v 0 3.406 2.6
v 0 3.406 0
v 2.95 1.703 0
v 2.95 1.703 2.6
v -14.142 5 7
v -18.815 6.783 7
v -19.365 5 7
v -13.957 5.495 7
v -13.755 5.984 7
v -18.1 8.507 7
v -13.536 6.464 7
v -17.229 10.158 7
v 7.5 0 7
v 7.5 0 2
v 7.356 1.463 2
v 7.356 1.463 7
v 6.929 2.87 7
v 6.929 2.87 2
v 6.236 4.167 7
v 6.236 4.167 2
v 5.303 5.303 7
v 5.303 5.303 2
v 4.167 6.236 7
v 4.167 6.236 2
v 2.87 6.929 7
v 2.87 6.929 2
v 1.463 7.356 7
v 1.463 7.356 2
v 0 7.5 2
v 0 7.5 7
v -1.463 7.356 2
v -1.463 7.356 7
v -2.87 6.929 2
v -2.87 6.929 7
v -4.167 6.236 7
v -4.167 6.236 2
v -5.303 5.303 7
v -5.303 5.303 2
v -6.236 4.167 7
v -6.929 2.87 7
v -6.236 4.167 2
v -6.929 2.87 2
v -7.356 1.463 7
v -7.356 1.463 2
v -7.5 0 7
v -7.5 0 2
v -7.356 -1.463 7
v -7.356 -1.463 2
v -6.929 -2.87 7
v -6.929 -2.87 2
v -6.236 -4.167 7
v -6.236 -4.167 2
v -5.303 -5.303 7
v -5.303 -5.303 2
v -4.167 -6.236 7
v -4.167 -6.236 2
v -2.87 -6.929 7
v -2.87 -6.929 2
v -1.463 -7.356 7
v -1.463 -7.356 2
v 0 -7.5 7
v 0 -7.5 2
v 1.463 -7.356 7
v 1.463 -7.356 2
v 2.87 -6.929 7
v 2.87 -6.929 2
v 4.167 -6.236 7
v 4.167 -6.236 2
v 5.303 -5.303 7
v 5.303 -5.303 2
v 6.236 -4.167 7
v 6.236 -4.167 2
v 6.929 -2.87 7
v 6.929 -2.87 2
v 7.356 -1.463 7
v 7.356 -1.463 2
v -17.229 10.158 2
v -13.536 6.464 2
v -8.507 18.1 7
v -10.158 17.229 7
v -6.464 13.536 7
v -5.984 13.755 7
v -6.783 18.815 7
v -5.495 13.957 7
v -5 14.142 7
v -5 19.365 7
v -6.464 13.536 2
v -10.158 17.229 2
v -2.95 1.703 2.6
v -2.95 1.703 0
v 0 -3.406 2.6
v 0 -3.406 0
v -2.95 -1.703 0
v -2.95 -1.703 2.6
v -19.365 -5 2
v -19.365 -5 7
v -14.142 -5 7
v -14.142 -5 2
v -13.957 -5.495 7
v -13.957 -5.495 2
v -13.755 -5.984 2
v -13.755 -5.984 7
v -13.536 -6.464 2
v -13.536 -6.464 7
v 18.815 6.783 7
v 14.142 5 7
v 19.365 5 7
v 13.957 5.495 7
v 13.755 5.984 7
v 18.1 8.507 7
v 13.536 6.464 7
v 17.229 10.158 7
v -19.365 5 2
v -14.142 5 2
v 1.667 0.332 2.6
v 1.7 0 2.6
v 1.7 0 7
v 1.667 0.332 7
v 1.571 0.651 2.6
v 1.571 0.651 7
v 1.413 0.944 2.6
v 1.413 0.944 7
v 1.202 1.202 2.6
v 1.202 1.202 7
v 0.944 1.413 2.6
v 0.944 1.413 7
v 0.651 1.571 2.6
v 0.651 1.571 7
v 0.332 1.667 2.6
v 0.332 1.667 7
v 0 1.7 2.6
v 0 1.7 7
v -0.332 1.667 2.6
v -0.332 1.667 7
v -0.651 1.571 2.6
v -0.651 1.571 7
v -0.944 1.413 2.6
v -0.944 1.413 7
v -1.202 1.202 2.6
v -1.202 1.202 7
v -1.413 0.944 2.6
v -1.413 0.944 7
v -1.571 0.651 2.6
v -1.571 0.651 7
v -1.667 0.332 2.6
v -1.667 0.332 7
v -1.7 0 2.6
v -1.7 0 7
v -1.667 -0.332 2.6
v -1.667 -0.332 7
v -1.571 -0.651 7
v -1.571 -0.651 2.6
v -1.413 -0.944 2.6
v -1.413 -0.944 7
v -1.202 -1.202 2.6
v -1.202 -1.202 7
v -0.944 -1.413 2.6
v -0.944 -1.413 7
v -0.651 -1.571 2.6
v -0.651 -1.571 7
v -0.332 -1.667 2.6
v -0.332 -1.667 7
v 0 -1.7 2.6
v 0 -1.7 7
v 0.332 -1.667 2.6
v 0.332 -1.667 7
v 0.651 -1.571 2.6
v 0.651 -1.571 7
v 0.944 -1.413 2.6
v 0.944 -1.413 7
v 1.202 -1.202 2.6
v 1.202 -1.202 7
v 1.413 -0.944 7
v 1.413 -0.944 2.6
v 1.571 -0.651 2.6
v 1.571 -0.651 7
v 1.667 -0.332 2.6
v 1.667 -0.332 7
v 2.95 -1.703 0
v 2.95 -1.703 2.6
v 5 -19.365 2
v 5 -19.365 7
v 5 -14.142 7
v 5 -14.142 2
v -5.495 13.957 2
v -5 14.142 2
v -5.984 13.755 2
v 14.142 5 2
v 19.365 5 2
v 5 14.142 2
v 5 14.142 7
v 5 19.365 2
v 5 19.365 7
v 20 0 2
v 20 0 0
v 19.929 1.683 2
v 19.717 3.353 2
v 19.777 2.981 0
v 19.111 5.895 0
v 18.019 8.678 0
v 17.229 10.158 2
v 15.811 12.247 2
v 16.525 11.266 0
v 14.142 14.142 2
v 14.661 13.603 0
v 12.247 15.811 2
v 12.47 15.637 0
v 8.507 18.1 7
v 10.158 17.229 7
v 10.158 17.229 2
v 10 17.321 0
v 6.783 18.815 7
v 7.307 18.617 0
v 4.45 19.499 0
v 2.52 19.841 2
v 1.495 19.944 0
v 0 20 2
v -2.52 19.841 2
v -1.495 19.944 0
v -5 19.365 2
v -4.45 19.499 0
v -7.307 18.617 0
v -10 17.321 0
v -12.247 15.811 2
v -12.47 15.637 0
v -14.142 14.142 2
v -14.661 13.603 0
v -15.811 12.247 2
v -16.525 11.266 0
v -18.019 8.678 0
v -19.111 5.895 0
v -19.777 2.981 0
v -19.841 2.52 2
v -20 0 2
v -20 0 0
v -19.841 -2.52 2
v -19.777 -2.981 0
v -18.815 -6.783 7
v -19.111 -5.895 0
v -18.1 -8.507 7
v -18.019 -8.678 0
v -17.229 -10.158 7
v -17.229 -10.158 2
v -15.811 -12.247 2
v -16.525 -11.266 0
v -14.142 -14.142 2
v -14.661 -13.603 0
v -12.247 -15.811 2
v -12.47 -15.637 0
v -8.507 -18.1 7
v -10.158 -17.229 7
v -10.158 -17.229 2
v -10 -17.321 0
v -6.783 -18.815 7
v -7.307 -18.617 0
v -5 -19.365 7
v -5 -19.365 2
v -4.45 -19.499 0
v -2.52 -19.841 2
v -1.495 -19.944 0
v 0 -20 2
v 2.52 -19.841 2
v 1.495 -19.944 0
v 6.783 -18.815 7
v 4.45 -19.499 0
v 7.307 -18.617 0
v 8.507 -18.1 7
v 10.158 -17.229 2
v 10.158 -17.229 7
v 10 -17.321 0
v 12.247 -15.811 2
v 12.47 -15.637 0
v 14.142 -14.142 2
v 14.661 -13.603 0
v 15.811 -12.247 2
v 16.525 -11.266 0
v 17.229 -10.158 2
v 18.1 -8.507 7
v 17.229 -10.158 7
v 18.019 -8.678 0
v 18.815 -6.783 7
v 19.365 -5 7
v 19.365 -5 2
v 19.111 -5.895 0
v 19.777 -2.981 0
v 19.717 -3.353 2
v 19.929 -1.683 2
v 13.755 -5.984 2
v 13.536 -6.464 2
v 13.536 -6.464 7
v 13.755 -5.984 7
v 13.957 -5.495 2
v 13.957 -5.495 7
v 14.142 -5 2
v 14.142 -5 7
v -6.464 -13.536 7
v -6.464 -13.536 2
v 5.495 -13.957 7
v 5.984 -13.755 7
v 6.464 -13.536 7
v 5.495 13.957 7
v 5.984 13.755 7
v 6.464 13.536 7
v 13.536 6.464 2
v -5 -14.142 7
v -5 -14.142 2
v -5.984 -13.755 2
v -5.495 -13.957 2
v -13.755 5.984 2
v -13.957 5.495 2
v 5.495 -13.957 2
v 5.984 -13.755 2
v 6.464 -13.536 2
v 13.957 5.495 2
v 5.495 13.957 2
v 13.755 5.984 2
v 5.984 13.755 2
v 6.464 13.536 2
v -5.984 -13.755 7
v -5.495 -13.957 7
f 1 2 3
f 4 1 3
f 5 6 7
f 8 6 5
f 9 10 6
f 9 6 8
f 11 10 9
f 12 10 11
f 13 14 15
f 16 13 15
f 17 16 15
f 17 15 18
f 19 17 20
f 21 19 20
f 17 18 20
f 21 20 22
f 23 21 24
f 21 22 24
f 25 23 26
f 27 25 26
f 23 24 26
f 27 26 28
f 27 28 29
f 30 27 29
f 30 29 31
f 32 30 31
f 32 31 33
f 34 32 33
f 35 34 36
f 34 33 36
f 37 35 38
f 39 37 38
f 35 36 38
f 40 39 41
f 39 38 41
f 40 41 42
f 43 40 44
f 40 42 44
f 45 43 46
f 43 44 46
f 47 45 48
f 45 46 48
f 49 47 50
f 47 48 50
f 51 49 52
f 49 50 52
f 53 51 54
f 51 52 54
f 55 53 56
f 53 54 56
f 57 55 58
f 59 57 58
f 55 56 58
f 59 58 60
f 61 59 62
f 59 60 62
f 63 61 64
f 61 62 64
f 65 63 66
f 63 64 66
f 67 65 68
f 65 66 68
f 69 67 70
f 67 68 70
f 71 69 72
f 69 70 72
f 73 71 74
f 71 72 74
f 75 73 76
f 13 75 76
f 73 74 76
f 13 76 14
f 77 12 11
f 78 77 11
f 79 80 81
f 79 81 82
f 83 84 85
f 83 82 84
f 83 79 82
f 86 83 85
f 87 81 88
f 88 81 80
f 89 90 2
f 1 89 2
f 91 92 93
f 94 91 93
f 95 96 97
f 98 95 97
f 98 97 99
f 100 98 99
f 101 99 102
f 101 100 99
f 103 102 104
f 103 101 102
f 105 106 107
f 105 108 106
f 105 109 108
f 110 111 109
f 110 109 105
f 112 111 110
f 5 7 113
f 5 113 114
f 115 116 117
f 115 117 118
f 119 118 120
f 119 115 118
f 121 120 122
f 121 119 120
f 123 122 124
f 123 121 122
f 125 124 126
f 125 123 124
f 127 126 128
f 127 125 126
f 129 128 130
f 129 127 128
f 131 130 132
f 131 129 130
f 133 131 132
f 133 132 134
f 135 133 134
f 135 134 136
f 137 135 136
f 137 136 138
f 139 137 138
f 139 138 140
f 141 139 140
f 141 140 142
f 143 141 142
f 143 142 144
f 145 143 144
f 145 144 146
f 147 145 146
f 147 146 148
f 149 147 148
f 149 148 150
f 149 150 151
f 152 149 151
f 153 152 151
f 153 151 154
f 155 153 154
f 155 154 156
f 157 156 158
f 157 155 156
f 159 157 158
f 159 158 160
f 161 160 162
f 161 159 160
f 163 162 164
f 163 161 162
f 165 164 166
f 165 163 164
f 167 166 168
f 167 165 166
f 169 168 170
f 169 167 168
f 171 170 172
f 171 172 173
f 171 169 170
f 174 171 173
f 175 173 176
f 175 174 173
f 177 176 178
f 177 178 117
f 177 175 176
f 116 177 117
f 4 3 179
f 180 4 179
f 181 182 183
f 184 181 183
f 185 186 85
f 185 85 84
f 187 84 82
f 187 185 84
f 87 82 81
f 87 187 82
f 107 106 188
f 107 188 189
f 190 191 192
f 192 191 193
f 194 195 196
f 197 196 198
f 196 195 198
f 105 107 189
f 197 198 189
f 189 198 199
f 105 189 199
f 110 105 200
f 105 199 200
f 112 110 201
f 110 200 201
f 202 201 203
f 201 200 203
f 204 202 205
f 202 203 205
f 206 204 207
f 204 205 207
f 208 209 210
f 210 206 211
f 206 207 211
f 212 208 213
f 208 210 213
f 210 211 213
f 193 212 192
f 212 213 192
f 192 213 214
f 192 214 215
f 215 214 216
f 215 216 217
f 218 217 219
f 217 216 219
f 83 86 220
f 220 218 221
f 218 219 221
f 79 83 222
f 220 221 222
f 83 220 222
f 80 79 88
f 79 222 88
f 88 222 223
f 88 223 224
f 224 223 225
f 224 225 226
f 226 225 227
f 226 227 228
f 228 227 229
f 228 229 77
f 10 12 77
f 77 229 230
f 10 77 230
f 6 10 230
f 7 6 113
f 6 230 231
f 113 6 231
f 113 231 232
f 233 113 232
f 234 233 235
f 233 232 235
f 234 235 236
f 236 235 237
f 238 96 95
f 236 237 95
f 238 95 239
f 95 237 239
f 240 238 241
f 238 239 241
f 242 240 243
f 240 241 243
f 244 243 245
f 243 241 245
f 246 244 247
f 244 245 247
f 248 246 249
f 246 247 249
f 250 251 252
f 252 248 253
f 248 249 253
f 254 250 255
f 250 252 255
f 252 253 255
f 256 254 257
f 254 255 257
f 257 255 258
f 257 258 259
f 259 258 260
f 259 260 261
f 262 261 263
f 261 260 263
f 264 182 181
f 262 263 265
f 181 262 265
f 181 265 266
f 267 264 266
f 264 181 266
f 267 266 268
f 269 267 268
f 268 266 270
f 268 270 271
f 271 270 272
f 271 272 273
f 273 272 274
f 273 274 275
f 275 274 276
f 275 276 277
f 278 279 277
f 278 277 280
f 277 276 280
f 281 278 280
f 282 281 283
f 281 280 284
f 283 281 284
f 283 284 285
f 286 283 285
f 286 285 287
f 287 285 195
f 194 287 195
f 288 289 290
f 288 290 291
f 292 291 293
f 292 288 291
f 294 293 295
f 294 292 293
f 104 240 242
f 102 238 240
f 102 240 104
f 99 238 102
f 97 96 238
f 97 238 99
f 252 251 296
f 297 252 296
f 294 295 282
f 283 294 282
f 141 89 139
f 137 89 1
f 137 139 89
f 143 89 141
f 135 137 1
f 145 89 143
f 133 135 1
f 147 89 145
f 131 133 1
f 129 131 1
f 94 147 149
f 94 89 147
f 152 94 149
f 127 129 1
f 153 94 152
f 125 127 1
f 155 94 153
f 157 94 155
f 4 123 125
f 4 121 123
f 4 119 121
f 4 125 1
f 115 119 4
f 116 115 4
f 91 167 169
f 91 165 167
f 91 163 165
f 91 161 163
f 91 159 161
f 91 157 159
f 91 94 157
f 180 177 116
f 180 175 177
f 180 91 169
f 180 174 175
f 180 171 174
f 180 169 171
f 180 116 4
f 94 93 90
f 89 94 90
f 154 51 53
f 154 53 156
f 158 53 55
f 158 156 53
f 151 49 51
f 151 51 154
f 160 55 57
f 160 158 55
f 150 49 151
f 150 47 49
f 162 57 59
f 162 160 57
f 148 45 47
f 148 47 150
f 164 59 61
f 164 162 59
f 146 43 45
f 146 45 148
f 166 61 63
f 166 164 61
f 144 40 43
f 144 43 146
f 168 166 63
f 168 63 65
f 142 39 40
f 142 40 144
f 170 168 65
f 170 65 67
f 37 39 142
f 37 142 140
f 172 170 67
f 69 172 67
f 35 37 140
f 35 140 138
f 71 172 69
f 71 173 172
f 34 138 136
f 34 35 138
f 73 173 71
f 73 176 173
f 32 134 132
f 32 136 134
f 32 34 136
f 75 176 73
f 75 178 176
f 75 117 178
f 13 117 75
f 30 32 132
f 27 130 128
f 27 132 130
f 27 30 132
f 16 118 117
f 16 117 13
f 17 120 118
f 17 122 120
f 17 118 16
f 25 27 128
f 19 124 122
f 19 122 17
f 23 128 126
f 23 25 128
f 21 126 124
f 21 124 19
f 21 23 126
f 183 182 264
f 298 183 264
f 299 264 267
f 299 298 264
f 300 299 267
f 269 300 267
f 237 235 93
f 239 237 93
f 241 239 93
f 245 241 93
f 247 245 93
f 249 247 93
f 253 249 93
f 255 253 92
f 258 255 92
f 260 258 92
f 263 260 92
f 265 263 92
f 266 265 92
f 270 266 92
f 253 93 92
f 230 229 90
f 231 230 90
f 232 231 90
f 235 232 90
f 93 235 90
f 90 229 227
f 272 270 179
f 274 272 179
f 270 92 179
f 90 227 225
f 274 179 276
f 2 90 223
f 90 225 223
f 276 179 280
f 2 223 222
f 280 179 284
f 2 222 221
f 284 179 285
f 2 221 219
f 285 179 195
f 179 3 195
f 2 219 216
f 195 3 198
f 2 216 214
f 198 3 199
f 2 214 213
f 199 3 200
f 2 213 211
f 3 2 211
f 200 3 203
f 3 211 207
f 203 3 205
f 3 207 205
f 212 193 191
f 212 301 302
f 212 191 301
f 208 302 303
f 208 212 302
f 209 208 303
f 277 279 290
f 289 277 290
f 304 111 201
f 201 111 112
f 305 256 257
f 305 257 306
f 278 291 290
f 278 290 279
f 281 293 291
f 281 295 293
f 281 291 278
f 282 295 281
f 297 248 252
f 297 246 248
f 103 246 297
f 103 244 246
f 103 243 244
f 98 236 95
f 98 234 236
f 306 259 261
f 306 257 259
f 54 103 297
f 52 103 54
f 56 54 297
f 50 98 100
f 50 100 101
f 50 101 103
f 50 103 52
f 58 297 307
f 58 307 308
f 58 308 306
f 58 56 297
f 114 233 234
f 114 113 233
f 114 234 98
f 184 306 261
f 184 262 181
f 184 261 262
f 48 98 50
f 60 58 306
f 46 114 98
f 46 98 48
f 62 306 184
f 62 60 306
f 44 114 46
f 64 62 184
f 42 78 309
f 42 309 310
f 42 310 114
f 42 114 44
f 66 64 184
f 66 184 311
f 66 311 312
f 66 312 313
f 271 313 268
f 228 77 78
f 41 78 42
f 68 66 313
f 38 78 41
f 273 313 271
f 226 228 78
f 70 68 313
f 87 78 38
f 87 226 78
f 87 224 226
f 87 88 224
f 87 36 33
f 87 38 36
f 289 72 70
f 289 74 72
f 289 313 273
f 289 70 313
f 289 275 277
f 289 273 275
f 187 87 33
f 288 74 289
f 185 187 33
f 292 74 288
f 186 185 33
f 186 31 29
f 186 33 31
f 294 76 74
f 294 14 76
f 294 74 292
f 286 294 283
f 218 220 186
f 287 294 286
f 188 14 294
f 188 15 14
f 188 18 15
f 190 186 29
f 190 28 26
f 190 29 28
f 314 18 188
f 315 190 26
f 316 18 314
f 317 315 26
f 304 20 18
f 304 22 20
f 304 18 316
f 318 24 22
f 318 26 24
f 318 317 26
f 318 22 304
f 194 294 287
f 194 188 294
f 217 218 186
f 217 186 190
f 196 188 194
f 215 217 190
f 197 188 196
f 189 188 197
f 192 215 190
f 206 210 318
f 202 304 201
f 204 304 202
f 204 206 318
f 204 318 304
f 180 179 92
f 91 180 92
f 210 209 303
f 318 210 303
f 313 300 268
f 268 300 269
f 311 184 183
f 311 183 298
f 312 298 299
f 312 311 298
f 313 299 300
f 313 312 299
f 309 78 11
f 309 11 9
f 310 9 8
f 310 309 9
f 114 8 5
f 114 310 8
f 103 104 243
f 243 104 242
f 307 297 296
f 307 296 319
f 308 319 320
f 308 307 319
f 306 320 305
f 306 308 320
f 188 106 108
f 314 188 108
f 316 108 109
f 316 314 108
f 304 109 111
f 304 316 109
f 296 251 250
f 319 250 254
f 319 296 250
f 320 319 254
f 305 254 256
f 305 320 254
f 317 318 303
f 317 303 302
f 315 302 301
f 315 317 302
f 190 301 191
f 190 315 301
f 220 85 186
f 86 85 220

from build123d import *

# Parameters (mm, degrees)
F0_R     = 20
F0_R_2   = 1.7
F1_DEPTH = 2
F2_R     = 20
F2_R_2   = 15
F2_R_3   = 7.5
F2_R_4   = 1.7
F3_DEPTH = 5
F4_W     = 10
F4_H     = 10
F5_DEPTH = 5
F6_R     = 1.7
F7_DEPTH = 2.6


with BuildPart() as f1:
    # F0 (on Top) → F1 (new body)
    with BuildSketch(Plane.XY):
        Circle(F0_R)
        Circle(F0_R_2, mode=Mode.SUBTRACT)
    extrude(amount=F1_DEPTH)

    # F2 (on face) → F3 (join)
    with BuildSketch(Plane.XY.offset(2)):
        Circle(F2_R)
        Circle(F2_R_2, mode=Mode.SUBTRACT)
        Circle(F2_R_3)
        Circle(F2_R_4, mode=Mode.SUBTRACT)
    extrude(amount=F3_DEPTH)

    # F4 (on face) → F5 (cut, through all)
    with BuildSketch(Plane.XY.offset(7)):
        with Locations((-18, 0)):
            Rectangle(F4_W, F4_H)
        Polygon((-12.7279220614, -5.6568542495), (-19.7989898732, -12.7279220614), (-12.7279220614, -19.7989898732), (-5.6568542495, -12.7279220614), align=None)
        with Locations((0, -18)):
            Rectangle(F4_W, F4_H)
        Polygon((5.6568542495, -12.7279220614), (12.7279220614, -19.7989898732), (19.7989898732, -12.7279220614), (12.7279220614, -5.6568542495), align=None)
        with Locations((18, 0)):
            Rectangle(F4_W, F4_H)
        Polygon((12.7279220614, 5.6568542495), (19.7989898732, 12.7279220614), (12.7279220614, 19.7989898732), (5.6568542495, 12.7279220614), align=None)
        with Locations((0, 18)):
            Rectangle(F4_W, F4_H)
        Polygon((-5.6568542495, 12.7279220614), (-12.7279220614, 19.7989898732), (-19.7989898732, 12.7279220614), (-12.7279220614, 5.6568542495), align=None)
    extrude(amount=-F5_DEPTH, mode=Mode.SUBTRACT)

    # F6 (on face) → F7 (cut)
    with BuildSketch(Plane(origin=(0, 0, 0), x_dir=(1, 0, 0), z_dir=(0, 0, -1))):
        Polygon((2.95, -1.7031832941), (2.95, 1.7031832941), (0, 3.4063665882), (-2.95, 1.7031832941), (-2.95, -1.7031832941), (0, -3.4063665882), align=None)
        Circle(F6_R, mode=Mode.SUBTRACT)
    extrude(amount=-F7_DEPTH, mode=Mode.SUBTRACT)


solid = f1.part
